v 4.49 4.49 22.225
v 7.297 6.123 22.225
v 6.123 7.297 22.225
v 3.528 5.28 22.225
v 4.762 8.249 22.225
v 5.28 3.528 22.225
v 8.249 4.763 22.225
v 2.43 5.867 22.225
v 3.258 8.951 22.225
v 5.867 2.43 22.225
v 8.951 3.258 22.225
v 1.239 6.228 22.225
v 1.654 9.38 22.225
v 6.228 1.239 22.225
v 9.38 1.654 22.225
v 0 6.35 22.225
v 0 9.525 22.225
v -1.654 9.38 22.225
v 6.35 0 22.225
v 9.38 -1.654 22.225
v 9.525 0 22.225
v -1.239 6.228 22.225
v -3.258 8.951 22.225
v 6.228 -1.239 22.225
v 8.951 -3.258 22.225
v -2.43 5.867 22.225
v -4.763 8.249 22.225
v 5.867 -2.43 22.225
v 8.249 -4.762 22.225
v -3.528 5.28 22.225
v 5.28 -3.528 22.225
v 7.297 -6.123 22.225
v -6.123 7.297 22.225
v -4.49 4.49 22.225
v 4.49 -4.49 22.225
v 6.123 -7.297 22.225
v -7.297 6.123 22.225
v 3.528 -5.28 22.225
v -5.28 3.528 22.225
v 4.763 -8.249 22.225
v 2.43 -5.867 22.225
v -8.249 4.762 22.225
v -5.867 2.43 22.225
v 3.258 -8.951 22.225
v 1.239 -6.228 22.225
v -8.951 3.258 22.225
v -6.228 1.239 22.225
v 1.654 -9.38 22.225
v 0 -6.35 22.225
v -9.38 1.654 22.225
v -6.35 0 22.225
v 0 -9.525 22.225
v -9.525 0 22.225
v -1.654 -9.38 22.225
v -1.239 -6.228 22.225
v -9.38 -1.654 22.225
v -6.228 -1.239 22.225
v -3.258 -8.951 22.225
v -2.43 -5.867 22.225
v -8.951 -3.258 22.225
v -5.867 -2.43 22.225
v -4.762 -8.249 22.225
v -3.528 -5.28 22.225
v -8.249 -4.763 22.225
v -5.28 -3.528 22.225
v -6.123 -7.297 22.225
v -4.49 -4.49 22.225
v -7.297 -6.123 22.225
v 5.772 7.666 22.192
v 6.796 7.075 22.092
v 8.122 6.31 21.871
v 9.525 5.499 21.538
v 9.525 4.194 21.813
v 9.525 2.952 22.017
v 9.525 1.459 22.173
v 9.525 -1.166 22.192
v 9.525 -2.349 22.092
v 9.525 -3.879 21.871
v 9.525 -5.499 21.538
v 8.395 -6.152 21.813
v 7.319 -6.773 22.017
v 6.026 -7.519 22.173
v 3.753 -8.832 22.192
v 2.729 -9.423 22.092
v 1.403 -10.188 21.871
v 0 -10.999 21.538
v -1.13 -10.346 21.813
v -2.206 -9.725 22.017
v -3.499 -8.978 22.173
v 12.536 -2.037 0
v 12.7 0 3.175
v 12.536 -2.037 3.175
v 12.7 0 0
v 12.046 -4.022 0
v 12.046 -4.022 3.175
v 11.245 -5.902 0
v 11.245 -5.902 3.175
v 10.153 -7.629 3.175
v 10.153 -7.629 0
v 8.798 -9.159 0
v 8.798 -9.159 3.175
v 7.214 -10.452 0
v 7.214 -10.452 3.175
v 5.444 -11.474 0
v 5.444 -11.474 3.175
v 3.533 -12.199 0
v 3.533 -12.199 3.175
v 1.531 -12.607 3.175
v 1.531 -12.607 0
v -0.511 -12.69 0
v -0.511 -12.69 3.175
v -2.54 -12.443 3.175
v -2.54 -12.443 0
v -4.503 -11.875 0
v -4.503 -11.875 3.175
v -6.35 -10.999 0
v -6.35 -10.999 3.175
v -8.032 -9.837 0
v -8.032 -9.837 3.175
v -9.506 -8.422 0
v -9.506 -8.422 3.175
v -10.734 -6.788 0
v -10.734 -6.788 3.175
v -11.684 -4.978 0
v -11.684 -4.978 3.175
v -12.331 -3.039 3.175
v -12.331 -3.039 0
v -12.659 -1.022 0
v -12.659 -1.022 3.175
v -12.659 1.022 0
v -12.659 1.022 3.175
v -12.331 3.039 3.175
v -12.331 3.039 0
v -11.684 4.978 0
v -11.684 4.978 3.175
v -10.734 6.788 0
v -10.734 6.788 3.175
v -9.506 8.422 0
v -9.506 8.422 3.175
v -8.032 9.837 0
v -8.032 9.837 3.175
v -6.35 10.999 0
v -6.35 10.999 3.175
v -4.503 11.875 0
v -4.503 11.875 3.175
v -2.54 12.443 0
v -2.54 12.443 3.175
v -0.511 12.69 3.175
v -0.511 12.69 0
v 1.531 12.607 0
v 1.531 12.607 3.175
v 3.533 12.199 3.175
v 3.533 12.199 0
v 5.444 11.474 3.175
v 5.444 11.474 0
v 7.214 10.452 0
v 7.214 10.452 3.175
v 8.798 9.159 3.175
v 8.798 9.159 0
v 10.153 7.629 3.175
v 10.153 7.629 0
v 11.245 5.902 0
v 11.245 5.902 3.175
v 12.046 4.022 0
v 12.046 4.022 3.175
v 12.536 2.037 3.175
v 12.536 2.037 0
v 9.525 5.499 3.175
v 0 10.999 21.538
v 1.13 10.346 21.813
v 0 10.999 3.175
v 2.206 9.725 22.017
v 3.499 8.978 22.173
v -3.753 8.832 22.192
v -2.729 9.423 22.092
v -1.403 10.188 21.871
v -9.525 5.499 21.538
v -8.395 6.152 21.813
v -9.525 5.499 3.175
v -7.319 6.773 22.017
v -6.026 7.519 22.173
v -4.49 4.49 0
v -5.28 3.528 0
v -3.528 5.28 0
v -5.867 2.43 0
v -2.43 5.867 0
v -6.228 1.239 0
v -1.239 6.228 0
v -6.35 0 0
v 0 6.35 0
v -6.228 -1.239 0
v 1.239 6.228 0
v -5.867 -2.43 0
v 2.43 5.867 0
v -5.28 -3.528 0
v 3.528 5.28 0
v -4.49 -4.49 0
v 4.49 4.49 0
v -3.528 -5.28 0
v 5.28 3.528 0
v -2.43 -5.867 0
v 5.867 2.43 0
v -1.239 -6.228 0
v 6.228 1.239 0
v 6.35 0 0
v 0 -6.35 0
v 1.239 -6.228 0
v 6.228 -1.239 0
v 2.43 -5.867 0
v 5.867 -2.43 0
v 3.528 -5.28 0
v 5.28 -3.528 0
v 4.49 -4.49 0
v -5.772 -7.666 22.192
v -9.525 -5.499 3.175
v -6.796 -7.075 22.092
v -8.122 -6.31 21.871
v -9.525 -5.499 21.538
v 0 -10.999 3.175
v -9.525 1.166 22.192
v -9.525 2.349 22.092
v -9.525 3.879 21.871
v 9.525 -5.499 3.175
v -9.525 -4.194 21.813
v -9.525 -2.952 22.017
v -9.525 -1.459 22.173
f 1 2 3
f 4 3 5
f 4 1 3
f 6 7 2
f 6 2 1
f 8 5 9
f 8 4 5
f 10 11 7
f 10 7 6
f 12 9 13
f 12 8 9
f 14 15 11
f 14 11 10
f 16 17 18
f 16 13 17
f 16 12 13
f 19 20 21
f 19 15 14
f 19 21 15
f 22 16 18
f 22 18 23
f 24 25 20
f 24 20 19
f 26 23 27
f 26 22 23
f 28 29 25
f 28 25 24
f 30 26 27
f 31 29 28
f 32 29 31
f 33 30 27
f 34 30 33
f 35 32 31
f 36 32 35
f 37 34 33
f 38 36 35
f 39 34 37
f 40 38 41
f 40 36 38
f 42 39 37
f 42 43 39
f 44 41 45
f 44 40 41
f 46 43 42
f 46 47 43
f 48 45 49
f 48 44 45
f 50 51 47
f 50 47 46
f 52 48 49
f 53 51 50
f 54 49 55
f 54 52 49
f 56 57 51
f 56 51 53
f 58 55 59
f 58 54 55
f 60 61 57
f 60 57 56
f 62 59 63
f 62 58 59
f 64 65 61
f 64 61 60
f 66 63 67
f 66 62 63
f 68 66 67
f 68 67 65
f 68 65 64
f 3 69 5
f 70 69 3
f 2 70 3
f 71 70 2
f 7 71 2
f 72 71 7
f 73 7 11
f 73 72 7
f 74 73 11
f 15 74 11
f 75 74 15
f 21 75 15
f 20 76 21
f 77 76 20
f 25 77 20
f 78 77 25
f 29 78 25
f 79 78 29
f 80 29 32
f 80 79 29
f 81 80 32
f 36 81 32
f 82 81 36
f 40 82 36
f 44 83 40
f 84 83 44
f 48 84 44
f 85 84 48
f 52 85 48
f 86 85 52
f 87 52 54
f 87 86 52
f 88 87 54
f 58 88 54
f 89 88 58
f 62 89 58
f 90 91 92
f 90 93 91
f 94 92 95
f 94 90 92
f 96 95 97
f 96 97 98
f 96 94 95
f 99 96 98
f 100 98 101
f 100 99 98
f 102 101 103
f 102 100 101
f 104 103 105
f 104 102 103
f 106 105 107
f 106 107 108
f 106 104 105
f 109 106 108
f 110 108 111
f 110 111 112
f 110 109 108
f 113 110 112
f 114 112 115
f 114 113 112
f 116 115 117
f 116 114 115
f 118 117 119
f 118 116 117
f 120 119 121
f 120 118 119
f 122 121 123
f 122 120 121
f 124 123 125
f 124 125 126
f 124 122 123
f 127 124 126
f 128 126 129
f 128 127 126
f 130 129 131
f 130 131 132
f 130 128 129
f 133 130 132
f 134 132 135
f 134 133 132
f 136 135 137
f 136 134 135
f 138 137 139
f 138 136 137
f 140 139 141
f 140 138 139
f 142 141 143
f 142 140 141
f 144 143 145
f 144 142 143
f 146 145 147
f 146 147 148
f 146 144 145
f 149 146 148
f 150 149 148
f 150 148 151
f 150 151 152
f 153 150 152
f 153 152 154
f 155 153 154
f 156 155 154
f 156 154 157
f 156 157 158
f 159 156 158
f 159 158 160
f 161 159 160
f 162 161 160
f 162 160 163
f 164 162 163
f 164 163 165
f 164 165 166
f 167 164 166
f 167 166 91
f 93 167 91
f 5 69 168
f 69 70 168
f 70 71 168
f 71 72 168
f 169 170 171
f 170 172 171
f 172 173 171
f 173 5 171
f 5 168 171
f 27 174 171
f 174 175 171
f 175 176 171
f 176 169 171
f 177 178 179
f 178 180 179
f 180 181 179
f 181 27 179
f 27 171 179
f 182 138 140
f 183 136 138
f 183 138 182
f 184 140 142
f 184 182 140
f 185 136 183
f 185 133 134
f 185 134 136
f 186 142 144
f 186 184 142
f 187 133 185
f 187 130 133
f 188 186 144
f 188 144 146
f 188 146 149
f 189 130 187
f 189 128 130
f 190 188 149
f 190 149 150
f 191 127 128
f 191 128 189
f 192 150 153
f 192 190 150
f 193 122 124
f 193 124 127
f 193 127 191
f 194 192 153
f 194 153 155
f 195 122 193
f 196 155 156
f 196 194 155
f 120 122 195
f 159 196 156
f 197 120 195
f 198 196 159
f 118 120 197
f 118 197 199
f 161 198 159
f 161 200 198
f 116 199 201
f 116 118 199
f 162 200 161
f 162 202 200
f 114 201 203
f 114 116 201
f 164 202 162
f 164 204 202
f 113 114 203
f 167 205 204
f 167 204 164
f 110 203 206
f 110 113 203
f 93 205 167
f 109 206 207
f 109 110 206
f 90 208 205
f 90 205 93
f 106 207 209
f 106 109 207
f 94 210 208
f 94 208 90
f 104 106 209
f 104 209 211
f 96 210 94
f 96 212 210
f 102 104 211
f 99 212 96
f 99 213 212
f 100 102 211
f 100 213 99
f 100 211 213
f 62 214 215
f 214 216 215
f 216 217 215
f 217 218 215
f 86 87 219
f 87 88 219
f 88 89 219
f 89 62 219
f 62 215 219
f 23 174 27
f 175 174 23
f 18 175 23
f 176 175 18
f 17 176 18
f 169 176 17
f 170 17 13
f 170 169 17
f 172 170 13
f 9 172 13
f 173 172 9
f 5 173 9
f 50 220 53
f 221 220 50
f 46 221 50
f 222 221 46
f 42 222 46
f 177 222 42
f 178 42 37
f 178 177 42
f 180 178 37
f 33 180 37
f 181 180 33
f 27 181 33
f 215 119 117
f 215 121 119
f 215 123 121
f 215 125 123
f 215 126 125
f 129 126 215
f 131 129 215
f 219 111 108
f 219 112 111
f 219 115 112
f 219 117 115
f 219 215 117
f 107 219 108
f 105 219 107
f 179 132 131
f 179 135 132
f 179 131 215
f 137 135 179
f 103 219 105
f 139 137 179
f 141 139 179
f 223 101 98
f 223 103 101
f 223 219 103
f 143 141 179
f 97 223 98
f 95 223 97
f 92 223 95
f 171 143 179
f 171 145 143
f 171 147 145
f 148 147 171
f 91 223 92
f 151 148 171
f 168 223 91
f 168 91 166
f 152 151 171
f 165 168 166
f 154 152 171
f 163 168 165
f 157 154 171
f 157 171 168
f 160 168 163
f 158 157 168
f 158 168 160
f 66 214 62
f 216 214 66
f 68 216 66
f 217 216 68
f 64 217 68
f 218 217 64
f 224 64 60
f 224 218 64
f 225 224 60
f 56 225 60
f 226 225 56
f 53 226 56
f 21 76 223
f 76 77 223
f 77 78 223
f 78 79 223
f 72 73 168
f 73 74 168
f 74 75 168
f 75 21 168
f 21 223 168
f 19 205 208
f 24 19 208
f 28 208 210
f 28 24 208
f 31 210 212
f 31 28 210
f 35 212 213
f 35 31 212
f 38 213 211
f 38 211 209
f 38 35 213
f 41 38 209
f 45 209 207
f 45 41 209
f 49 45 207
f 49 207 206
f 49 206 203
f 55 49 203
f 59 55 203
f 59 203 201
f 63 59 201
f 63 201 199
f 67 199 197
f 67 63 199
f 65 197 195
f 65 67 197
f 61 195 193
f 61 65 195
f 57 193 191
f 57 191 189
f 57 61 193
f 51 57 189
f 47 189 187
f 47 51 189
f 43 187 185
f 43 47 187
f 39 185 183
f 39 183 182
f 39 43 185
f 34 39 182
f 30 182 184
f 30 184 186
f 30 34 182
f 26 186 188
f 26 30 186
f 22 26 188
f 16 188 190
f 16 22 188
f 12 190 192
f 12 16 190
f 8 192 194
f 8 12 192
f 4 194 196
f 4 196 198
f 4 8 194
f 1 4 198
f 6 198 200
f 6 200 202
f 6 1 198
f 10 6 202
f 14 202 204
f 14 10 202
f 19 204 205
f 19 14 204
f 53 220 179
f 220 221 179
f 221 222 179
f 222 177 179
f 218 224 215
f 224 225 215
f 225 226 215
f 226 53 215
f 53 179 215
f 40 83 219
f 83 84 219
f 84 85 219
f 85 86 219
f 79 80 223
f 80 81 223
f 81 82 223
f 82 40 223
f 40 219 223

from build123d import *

# Parameters (mm, degrees)
CUT_HEX_START     = 3.175
SKETCH2_OUTSIDE_W = 35.848
SKETCH2_OUTSIDE_H = 35.848
CUT_HEX_DEPTH     = 26.4


with BuildPart() as part:
    # Sketch1 → Revolve1 (revolve)
    with BuildSketch(Plane(origin=(0, 0, 0), x_dir=(0, 0, -1), z_dir=(1, 0, 0))):
        Polygon((-20.744473185, 12.7), (0, 12.7), (0, 6.35), (-22.225, 6.35), (-22.225, 9.525), align=None)
    revolve(axis=Axis((0, 0, 34.597150245), (0, 0, -1)))

    # Sketch2 outside → Cut-HEX (cut, through all)
    with BuildSketch(Plane.XY.offset(CUT_HEX_START)):
        Rectangle(SKETCH2_OUTSIDE_W, SKETCH2_OUTSIDE_H)
        Polygon((9.525, -5.499261314), (9.525, 5.499261314), (0, 10.998522628), (-9.525, 5.499261314), (-9.525, -5.499261314), (0, -10.998522628), align=None, mode=Mode.SUBTRACT)
    extrude(amount=CUT_HEX_DEPTH, mode=Mode.SUBTRACT)


solid = part.part
